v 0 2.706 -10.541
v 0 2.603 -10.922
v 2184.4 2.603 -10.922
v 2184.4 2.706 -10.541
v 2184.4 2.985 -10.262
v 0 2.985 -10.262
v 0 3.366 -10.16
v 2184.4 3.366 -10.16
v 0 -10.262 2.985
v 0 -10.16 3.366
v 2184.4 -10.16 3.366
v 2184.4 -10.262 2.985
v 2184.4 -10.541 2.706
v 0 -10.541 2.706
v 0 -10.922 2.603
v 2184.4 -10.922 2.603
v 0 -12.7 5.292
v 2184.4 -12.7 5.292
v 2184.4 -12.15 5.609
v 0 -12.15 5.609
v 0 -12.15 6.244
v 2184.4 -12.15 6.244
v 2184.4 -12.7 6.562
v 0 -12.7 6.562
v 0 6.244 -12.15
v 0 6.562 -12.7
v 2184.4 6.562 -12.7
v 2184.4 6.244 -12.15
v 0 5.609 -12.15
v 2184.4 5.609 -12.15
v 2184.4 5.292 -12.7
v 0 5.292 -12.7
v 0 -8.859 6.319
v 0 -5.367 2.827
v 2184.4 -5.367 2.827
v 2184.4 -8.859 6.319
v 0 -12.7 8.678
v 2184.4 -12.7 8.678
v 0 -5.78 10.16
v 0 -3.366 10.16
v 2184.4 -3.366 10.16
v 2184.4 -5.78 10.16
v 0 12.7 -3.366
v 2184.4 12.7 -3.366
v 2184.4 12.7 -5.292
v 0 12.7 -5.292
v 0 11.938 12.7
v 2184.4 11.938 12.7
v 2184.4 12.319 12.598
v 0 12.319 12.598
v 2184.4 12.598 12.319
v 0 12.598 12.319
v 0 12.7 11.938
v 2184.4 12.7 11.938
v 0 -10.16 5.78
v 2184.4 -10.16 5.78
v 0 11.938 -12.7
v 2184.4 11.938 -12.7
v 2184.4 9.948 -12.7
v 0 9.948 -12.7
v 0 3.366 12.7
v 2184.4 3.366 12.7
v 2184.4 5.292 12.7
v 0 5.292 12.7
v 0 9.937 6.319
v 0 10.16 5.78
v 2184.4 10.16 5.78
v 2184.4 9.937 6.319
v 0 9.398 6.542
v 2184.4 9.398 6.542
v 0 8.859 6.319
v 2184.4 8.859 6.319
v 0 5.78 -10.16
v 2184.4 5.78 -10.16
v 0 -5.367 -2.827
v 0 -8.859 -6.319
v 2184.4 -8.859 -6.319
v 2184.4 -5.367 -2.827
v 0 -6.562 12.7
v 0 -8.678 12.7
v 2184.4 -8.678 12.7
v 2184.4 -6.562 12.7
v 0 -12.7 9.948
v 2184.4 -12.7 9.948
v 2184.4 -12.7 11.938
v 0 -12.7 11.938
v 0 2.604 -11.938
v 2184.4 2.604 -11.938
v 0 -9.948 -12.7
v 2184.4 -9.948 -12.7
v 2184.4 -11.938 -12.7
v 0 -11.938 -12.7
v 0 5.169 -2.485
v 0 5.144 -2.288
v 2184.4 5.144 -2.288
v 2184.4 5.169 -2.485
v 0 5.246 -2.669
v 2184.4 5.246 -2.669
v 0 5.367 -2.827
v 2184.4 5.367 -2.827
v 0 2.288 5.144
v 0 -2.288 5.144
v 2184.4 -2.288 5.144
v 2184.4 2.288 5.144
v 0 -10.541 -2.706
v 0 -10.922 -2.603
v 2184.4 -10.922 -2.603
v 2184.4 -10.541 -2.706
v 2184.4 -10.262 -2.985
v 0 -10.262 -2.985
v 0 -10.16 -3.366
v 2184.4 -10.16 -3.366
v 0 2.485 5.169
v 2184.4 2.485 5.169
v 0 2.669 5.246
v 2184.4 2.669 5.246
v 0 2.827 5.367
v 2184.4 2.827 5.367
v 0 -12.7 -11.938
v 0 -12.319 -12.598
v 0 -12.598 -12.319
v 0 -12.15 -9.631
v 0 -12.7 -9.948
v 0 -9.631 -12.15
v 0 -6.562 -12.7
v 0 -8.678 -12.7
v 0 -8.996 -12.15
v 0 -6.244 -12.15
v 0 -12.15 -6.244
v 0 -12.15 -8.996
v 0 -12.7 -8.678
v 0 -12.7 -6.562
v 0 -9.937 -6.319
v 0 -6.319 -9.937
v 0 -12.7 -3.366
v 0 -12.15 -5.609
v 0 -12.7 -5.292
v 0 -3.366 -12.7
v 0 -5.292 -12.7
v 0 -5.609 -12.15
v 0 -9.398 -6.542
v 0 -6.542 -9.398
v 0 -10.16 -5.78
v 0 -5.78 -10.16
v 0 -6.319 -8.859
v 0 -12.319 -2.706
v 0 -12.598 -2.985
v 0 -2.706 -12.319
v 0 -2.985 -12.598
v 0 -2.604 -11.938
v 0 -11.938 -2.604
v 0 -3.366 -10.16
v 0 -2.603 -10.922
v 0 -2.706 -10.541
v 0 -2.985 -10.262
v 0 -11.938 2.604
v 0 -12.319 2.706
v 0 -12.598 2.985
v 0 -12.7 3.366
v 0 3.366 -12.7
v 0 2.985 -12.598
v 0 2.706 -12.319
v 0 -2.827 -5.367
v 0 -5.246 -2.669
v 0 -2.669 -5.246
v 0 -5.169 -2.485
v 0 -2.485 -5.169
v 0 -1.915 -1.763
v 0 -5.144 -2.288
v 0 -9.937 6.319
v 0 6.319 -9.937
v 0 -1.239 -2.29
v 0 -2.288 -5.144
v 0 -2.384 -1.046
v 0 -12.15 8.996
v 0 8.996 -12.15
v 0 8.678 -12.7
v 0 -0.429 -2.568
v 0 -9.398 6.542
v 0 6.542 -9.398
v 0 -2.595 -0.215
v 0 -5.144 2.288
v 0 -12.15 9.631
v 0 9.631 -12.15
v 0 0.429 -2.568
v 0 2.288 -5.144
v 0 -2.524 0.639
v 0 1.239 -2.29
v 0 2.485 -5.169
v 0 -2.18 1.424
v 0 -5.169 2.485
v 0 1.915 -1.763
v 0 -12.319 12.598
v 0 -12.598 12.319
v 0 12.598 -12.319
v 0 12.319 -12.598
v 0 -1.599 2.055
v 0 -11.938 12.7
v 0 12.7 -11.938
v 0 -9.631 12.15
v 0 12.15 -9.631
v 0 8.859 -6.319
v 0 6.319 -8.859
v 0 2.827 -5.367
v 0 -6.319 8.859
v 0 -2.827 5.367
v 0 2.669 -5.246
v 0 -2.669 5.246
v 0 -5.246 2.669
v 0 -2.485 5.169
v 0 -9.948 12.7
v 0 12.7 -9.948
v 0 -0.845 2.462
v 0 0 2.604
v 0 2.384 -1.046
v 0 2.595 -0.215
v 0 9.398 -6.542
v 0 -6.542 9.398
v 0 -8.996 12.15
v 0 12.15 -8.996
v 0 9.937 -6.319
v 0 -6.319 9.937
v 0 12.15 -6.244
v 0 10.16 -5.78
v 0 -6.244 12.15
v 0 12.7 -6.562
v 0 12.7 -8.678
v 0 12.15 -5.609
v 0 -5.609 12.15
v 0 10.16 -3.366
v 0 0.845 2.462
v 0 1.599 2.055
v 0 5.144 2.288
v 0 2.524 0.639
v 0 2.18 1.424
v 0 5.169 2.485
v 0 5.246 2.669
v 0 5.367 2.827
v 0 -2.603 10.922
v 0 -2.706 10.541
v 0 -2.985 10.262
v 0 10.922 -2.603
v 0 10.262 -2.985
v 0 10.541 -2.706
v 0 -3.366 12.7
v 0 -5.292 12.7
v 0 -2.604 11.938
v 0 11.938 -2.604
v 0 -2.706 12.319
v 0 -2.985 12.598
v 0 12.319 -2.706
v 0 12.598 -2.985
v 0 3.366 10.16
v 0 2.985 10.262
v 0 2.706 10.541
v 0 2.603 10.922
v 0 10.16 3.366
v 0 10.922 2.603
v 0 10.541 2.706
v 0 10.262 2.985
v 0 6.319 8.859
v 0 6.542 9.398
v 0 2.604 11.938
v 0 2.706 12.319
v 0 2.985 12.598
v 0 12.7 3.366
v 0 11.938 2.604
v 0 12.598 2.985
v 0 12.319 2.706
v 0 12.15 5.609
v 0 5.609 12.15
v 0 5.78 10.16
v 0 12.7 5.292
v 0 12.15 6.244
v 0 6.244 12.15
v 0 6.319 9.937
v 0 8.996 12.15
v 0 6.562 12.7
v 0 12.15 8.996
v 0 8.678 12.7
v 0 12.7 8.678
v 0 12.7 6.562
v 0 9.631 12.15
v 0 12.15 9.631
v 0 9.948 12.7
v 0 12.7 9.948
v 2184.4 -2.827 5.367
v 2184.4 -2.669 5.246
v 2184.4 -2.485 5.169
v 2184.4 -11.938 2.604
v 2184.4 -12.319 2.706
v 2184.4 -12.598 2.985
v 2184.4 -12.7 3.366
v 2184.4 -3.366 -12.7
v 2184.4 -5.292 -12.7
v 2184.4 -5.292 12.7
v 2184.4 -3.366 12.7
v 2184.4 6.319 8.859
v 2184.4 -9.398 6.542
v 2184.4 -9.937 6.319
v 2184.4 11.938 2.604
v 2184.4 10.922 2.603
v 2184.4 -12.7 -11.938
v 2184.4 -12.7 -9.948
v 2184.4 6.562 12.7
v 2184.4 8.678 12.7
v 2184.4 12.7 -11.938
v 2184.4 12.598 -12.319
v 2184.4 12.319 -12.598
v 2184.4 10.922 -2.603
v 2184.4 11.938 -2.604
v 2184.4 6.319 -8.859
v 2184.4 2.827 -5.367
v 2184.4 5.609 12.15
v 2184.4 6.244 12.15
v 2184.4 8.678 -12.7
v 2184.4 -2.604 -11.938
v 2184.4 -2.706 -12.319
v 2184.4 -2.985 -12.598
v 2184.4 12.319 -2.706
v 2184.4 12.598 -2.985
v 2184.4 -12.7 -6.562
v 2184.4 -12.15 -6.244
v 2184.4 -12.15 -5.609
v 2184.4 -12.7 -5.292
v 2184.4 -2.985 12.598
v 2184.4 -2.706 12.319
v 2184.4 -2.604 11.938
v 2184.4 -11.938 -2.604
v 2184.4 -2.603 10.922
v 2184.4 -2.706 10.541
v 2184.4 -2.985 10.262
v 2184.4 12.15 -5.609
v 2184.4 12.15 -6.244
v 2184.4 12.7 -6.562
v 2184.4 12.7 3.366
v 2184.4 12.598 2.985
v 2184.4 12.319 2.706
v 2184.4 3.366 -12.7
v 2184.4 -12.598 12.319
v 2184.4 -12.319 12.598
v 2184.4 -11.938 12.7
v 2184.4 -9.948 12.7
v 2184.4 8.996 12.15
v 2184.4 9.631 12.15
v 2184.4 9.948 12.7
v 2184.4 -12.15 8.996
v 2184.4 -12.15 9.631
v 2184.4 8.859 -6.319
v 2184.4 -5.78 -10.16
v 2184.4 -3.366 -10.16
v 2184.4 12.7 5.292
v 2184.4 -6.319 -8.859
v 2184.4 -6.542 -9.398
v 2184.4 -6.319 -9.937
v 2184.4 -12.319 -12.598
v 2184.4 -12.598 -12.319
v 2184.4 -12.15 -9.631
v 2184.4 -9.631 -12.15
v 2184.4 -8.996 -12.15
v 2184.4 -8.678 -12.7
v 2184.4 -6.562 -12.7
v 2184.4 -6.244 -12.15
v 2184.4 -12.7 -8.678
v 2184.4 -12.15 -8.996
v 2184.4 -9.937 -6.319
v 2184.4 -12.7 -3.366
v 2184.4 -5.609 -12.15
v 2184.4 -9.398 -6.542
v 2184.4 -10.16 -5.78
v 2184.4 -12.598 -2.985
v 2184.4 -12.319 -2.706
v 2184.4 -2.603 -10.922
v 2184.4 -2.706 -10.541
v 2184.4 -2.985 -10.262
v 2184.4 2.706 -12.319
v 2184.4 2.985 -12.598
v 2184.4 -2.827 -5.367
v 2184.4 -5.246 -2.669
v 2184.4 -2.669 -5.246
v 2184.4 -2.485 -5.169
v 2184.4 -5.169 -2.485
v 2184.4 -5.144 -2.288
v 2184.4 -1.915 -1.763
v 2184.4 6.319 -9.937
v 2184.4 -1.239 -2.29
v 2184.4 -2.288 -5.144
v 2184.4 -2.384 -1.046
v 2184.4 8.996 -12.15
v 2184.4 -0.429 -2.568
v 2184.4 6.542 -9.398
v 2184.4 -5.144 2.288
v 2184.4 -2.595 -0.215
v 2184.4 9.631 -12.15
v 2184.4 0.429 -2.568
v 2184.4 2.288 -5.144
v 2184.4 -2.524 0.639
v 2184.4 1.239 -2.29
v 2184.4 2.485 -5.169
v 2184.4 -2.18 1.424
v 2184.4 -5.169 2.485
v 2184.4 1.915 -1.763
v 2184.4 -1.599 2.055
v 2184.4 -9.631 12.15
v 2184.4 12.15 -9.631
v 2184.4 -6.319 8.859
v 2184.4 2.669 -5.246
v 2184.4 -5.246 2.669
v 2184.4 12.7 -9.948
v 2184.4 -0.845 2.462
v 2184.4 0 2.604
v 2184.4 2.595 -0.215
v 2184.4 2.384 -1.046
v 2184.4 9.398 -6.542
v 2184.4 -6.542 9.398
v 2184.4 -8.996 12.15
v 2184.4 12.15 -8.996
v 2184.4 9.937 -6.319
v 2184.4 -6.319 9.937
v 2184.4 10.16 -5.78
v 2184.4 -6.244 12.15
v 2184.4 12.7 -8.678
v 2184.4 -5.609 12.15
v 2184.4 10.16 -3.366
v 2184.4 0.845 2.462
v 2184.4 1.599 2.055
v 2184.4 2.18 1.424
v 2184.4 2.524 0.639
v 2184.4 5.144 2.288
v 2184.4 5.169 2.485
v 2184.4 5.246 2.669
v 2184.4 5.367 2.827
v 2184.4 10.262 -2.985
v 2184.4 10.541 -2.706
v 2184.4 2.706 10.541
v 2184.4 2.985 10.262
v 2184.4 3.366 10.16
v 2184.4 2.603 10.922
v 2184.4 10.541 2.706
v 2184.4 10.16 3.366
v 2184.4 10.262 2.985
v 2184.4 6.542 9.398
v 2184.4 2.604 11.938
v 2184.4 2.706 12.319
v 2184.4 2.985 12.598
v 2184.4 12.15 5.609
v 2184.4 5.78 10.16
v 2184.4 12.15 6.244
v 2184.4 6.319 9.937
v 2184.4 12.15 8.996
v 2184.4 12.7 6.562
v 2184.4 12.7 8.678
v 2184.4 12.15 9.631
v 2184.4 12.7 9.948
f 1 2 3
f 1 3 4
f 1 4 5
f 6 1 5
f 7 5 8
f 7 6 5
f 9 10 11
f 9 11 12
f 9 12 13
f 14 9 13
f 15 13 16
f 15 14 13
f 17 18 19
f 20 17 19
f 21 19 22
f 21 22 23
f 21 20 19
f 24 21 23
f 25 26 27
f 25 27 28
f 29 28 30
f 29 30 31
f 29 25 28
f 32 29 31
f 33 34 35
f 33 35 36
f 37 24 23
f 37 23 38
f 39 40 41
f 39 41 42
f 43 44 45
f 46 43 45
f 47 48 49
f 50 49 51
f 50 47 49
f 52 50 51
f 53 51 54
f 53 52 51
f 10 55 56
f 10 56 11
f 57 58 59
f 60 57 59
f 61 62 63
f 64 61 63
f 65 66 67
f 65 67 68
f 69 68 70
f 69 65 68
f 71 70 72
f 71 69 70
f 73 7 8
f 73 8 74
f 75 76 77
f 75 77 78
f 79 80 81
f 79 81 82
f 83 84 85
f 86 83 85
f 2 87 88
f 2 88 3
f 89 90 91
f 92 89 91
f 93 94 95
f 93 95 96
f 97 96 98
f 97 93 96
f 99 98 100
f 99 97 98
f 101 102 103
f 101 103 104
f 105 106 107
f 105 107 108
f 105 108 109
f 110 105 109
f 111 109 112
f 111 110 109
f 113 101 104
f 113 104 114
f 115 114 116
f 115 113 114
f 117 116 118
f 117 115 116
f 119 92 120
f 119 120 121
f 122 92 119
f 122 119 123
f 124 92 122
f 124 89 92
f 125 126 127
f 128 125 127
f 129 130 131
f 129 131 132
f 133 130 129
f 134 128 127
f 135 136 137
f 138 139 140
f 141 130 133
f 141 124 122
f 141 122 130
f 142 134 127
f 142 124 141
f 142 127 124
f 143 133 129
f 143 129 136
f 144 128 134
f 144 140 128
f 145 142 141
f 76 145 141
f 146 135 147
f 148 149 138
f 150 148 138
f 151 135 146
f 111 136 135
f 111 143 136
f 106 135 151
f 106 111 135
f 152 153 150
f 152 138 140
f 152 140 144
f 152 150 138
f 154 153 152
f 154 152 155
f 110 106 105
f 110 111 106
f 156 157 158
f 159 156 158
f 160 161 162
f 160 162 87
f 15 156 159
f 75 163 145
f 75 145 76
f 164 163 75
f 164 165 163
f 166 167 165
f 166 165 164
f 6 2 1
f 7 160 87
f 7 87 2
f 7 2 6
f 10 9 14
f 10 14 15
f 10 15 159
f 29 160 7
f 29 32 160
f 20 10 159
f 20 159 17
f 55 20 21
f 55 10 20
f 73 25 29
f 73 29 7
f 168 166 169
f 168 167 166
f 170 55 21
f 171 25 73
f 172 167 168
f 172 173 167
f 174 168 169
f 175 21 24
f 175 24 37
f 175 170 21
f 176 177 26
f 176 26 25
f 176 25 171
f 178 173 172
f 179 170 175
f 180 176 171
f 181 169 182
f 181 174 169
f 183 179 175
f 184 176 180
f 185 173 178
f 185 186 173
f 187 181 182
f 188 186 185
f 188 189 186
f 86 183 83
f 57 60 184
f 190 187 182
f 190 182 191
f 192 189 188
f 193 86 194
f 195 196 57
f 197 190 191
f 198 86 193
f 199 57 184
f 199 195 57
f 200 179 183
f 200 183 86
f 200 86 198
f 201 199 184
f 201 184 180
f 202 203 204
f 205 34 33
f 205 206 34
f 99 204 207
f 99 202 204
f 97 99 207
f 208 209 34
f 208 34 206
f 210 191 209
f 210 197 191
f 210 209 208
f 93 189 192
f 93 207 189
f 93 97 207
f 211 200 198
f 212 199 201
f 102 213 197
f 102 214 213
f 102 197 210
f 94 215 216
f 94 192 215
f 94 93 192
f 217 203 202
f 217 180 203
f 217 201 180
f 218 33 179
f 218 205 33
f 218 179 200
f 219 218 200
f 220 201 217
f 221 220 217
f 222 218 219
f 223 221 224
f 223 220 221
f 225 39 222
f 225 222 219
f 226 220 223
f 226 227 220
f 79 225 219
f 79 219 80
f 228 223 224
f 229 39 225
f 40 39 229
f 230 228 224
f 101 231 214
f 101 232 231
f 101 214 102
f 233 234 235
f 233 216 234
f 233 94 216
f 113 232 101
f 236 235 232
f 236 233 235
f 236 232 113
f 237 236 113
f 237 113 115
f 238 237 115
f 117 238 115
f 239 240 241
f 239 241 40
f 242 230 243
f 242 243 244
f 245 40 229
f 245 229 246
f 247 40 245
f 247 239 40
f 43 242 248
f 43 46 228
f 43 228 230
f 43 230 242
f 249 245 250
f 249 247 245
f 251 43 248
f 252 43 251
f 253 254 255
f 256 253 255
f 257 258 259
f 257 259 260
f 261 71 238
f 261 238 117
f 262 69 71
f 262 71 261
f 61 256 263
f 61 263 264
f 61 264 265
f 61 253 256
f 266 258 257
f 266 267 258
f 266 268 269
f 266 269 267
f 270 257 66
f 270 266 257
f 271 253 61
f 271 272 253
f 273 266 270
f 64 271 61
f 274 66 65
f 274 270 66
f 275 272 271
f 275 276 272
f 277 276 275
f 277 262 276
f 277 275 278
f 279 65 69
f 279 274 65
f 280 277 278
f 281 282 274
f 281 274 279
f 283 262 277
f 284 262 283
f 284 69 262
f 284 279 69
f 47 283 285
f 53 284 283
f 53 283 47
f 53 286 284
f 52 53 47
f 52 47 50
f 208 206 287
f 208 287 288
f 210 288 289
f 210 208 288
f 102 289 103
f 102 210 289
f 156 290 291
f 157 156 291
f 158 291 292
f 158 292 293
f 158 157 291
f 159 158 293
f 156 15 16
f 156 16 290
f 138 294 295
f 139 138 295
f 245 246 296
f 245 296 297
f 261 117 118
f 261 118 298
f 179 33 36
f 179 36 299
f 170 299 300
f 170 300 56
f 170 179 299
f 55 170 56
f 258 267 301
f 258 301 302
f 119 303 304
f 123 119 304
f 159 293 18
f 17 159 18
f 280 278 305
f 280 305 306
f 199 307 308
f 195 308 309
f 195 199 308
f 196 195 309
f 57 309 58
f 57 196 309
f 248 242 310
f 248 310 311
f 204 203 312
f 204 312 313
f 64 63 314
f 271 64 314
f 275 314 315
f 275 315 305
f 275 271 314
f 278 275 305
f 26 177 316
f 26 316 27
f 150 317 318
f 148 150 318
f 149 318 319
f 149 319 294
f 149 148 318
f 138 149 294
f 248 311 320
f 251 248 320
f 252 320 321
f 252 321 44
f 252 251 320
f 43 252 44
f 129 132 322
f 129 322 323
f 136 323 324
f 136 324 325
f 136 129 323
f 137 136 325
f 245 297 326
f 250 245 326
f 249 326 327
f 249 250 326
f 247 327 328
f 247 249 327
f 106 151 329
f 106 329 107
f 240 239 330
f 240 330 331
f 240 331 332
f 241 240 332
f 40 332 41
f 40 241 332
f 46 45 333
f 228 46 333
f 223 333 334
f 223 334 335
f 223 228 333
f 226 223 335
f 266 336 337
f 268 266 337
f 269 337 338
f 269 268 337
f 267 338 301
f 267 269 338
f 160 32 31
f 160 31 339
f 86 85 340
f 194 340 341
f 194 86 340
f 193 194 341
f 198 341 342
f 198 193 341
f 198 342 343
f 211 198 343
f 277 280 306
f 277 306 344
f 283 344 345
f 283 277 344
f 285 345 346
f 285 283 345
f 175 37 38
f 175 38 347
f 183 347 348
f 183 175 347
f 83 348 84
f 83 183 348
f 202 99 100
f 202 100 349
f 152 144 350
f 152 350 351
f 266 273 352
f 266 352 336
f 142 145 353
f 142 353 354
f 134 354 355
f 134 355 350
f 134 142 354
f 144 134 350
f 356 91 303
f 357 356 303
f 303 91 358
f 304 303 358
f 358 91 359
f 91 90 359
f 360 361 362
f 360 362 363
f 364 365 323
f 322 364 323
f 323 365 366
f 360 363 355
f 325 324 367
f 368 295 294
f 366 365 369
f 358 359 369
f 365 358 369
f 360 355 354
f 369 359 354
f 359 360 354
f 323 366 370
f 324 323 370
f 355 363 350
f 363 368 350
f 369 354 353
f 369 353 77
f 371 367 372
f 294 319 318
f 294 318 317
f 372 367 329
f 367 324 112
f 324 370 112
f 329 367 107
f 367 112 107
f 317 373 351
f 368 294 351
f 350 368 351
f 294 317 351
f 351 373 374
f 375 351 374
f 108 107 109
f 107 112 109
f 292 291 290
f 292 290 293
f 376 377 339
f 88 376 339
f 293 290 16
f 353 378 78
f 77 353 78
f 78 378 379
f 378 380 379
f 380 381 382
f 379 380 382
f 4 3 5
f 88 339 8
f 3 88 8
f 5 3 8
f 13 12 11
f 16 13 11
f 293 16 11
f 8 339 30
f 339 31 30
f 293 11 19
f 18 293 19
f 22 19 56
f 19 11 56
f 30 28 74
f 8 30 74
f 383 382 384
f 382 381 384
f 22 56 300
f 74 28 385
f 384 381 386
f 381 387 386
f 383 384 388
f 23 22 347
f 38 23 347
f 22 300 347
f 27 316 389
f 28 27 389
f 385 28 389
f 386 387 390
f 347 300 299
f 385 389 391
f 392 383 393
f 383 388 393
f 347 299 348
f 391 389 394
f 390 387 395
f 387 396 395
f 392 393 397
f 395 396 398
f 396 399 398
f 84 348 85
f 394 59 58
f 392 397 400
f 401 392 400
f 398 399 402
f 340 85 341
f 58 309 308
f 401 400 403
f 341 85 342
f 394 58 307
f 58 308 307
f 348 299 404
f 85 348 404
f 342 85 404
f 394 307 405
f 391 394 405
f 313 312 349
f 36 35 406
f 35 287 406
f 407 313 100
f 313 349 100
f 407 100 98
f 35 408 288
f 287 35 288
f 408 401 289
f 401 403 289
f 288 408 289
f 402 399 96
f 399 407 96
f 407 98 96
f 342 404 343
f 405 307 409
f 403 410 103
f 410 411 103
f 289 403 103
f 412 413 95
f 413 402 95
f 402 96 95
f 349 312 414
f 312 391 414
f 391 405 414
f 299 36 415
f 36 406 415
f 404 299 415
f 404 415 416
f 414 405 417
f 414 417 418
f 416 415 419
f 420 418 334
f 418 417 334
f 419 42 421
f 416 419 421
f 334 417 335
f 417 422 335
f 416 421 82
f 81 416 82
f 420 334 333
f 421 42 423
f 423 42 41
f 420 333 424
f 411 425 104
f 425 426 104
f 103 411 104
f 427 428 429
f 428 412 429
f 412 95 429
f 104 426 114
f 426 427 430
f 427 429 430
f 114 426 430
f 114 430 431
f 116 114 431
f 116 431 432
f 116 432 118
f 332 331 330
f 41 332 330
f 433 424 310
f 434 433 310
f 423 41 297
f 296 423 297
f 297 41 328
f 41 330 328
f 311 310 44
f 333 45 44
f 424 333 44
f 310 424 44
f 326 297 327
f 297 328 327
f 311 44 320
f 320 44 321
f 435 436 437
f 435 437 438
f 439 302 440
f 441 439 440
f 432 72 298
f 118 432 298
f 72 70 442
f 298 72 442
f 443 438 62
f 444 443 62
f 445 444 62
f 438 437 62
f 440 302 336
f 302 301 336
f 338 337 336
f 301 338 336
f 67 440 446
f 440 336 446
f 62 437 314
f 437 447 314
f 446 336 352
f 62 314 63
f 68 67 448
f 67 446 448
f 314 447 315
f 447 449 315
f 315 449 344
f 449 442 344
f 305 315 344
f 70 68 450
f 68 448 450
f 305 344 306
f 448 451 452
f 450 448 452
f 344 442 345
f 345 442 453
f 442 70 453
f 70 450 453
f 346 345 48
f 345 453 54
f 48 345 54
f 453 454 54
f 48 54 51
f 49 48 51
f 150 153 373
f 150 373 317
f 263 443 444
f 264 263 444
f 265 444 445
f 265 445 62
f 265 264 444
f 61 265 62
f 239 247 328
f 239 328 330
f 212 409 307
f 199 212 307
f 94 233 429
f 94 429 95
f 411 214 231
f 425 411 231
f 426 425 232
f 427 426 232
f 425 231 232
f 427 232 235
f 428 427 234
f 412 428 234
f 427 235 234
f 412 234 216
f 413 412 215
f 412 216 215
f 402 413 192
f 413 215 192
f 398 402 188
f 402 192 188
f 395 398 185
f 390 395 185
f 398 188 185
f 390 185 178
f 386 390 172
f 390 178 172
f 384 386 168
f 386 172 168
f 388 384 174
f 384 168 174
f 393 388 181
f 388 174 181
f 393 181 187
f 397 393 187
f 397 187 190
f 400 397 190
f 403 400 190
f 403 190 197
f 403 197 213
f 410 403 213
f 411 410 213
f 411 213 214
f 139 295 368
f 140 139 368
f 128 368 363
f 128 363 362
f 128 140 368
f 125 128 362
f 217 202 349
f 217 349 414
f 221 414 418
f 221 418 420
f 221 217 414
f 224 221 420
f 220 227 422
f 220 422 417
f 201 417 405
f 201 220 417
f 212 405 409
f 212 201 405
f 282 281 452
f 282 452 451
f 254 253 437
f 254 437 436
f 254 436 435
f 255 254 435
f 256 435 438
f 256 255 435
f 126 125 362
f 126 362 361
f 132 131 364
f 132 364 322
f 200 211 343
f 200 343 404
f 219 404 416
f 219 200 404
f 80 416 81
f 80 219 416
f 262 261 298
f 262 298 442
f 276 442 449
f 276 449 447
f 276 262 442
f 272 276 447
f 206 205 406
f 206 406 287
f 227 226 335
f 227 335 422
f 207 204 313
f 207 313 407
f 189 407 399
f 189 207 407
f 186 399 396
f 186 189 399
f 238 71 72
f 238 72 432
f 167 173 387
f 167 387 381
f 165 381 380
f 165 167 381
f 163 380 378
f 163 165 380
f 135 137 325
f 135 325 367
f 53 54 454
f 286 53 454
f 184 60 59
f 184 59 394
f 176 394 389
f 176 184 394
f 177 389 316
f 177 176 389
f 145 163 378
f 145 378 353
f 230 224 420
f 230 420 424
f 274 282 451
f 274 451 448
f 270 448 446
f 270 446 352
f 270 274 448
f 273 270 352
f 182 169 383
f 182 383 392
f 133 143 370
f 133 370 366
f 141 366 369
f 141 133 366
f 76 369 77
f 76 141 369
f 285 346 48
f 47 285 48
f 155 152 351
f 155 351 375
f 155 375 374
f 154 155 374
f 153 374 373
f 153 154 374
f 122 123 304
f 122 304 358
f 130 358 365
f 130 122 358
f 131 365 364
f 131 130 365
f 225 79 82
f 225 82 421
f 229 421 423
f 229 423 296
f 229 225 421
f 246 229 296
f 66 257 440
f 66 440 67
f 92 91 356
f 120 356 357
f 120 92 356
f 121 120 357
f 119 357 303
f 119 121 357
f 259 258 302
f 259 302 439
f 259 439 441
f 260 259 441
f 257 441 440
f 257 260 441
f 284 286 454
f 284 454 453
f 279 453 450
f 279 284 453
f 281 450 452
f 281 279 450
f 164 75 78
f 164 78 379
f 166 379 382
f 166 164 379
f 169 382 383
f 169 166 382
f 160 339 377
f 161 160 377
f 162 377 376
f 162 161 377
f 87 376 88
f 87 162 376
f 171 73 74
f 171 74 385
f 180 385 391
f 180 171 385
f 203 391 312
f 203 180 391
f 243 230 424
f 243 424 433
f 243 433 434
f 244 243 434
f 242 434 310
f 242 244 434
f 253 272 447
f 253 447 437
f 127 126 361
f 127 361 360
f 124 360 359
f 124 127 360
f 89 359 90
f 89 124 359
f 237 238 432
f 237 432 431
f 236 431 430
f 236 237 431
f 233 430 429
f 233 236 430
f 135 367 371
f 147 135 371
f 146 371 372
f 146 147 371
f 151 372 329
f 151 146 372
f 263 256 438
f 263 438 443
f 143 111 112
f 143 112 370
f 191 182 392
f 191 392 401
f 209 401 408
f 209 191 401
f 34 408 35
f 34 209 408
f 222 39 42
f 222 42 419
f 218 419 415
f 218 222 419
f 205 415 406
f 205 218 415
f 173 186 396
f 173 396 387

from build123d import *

# Parameters (mm, degrees)
BOSS_EXTRUDE1_DEPTH = 2184.4
SKETCH2_R           = 2.6035
CUT_EXTRUDE1_DEPTH  = 2184.4


with BuildPart() as part:
    # Sketch1 → Boss-Extrude1 (new body)
    with BuildSketch(Plane(origin=(0, 0, 0), x_dir=(0, 0, -1), z_dir=(1, 0, 0))):
        with BuildLine():
            Line((-2.6035, 11.938), (-2.6035, 10.922))
            ThreePointArc((-2.6035, 10.922), (-2.826684633, 10.383184633), (-3.3655, 10.16))
            Line((-3.3655, 10.16), (-5.780369265, 10.16))
            ThreePointArc((-5.780369265, 10.16), (-6.484365469, 9.689604775), (-6.319184633, 8.859184633))
            Line((-6.319184633, 8.859184633), (-2.826684633, 5.366684633))
            ThreePointArc((-2.826684633, 5.366684633), (-2.579474041, 5.201503796), (-2.287869265, 5.1435))
            Line((-2.287869265, 5.1435), (2.287869265, 5.1435))
            ThreePointArc((2.287869265, 5.1435), (2.579474041, 5.201503796), (2.826684633, 5.366684633))
            Line((2.826684633, 5.366684633), (6.319184633, 8.859184633))
            ThreePointArc((6.319184633, 8.859184633), (6.484365469, 9.689604775), (5.780369265, 10.16))
            Line((5.780369265, 10.16), (3.3655, 10.16))
            ThreePointArc((3.3655, 10.16), (2.826684633, 10.383184633), (2.6035, 10.922))
            Line((2.6035, 10.922), (2.6035, 11.938))
            ThreePointArc((2.6035, 11.938), (2.826684633, 12.476815367), (3.3655, 12.7))
            Line((3.3655, 12.7), (5.2917598, 12.7))
            ThreePointArc((5.2917598, 12.7), (5.9267598, 12.065), (6.5617598, 12.7))
            Line((6.5617598, 12.7), (8.6783418, 12.7))
            ThreePointArc((8.6783418, 12.7), (9.3133418, 12.065), (9.9483418, 12.7))
            Line((9.9483418, 12.7), (11.938, 12.7))
            ThreePointArc((11.938, 12.7), (12.476815367, 12.476815367), (12.7, 11.938))
            Line((12.7, 11.938), (12.7, 9.9483418))
            ThreePointArc((12.7, 9.9483418), (12.065, 9.3133418), (12.7, 8.6783418))
            Line((12.7, 8.6783418), (12.7, 6.5616836))
            ThreePointArc((12.7, 6.5616836), (12.065, 5.9266836), (12.7, 5.2916836))
            Line((12.7, 5.2916836), (12.7, 3.3655))
            ThreePointArc((12.7, 3.3655), (12.476815367, 2.826684633), (11.938, 2.6035))
            Line((11.938, 2.6035), (10.922, 2.6035))
            ThreePointArc((10.922, 2.6035), (10.383184633, 2.826684633), (10.16, 3.3655))
            Line((10.16, 3.3655), (10.16, 5.780369265))
            ThreePointArc((10.16, 5.780369265), (9.689604775, 6.484365469), (8.859184633, 6.319184633))
            Line((8.859184633, 6.319184633), (5.366684633, 2.826684633))
            ThreePointArc((5.366684633, 2.826684633), (5.201503796, 2.579474041), (5.1435, 2.287869265))
            Line((5.1435, 2.287869265), (5.1435, -2.287869265))
            ThreePointArc((5.1435, -2.287869265), (5.201503796, -2.579474041), (5.366684633, -2.826684633))
            Line((5.366684633, -2.826684633), (8.859184633, -6.319184633))
            ThreePointArc((8.859184633, -6.319184633), (9.689604775, -6.484365469), (10.16, -5.780369265))
            Line((10.16, -5.780369265), (10.16, -3.3655))
            ThreePointArc((10.16, -3.3655), (10.383184633, -2.826684633), (10.922, -2.6035))
            Line((10.922, -2.6035), (11.938, -2.6035))
            ThreePointArc((11.938, -2.6035), (12.476815367, -2.826684633), (12.7, -3.3655))
            Line((12.7, -3.3655), (12.7, -5.2917598))
            ThreePointArc((12.7, -5.2917598), (12.065, -5.9267598), (12.7, -6.5617598))
            Line((12.7, -6.5617598), (12.7, -8.6783418))
            ThreePointArc((12.7, -8.6783418), (12.065, -9.3133418), (12.7, -9.9483418))
            Line((12.7, -9.9483418), (12.7, -11.938))
            ThreePointArc((12.7, -11.938), (12.476815367, -12.476815367), (11.938, -12.7))
            Line((11.938, -12.7), (9.9483418, -12.7))
            ThreePointArc((9.9483418, -12.7), (9.3133418, -12.065), (8.6783418, -12.7))
            Line((8.6783418, -12.7), (6.5616836, -12.7))
            ThreePointArc((6.5616836, -12.7), (5.9266836, -12.065), (5.2916836, -12.7))
            Line((5.2916836, -12.7), (3.3655, -12.7))
            ThreePointArc((3.3655, -12.7), (2.826684633, -12.476815367), (2.6035, -11.938))
            Line((2.6035, -11.938), (2.6035, -10.922))
            ThreePointArc((2.6035, -10.922), (2.826684633, -10.383184633), (3.3655, -10.16))
            Line((3.3655, -10.16), (5.780369265, -10.16))
            ThreePointArc((5.780369265, -10.16), (6.484365469, -9.689604775), (6.319184633, -8.859184633))
            Line((6.319184633, -8.859184633), (2.826684633, -5.366684633))
            ThreePointArc((2.826684633, -5.366684633), (2.579474041, -5.201503796), (2.287869265, -5.1435))
            Line((2.287869265, -5.1435), (-2.287869265, -5.1435))
            ThreePointArc((-2.287869265, -5.1435), (-2.579474041, -5.201503796), (-2.826684633, -5.366684633))
            Line((-2.826684633, -5.366684633), (-6.319184633, -8.859184633))
            ThreePointArc((-6.319184633, -8.859184633), (-6.484365469, -9.689604775), (-5.780369265, -10.16))
            Line((-5.780369265, -10.16), (-3.3655, -10.16))
            ThreePointArc((-3.3655, -10.16), (-2.826684633, -10.383184633), (-2.6035, -10.922))
            Line((-2.6035, -10.922), (-2.6035, -11.938))
            ThreePointArc((-2.6035, -11.938), (-2.826684633, -12.476815367), (-3.3655, -12.7))
            Line((-3.3655, -12.7), (-5.2917598, -12.7))
            ThreePointArc((-5.2917598, -12.7), (-5.9267598, -12.065), (-6.5617598, -12.7))
            Line((-6.5617598, -12.7), (-8.6783418, -12.7))
            ThreePointArc((-8.6783418, -12.7), (-9.3133418, -12.065), (-9.9483418, -12.7))
            Line((-9.9483418, -12.7), (-11.938, -12.7))
            ThreePointArc((-11.938, -12.7), (-12.476815367, -12.476815367), (-12.7, -11.938))
            Line((-12.7, -11.938), (-12.7, -9.9483418))
            ThreePointArc((-12.7, -9.9483418), (-12.065, -9.3133418), (-12.7, -8.6783418))
            Line((-12.7, -8.6783418), (-12.7, -6.5616836))
            ThreePointArc((-12.7, -6.5616836), (-12.065, -5.9266836), (-12.7, -5.2916836))
            Line((-12.7, -5.2916836), (-12.7, -3.3655))
            ThreePointArc((-12.7, -3.3655), (-12.476815367, -2.826684633), (-11.938, -2.6035))
            Line((-11.938, -2.6035), (-10.922, -2.6035))
            ThreePointArc((-10.922, -2.6035), (-10.383184633, -2.826684633), (-10.16, -3.3655))
            Line((-10.16, -3.3655), (-10.16, -5.780369265))
            ThreePointArc((-10.16, -5.780369265), (-9.689604775, -6.484365469), (-8.859184633, -6.319184633))
            Line((-8.859184633, -6.319184633), (-5.366684633, -2.826684633))
            ThreePointArc((-5.366684633, -2.826684633), (-5.201503796, -2.579474041), (-5.1435, -2.287869265))
            Line((-5.1435, -2.287869265), (-5.1435, 2.287869265))
            ThreePointArc((-5.1435, 2.287869265), (-5.201503796, 2.579474041), (-5.366684633, 2.826684633))
            Line((-5.366684633, 2.826684633), (-8.859184633, 6.319184633))
            ThreePointArc((-8.859184633, 6.319184633), (-9.689604775, 6.484365469), (-10.16, 5.780369265))
            Line((-10.16, 5.780369265), (-10.16, 3.3655))
            ThreePointArc((-10.16, 3.3655), (-10.383184633, 2.826684633), (-10.922, 2.6035))
            Line((-10.922, 2.6035), (-11.938, 2.6035))
            ThreePointArc((-11.938, 2.6035), (-12.476815367, 2.826684633), (-12.7, 3.3655))
            Line((-12.7, 3.3655), (-12.7, 5.2917598))
            ThreePointArc((-12.7, 5.2917598), (-12.065, 5.9267598), (-12.7, 6.5617598))
            Line((-12.7, 6.5617598), (-12.7, 8.6783418))
            ThreePointArc((-12.7, 8.6783418), (-12.065, 9.3133418), (-12.7, 9.9483418))
            Line((-12.7, 9.9483418), (-12.7, 11.938))
            ThreePointArc((-12.7, 11.938), (-12.476815367, 12.476815367), (-11.938, 12.7))
            Line((-11.938, 12.7), (-9.9483418, 12.7))
            ThreePointArc((-9.9483418, 12.7), (-9.3133418, 12.065), (-8.6783418, 12.7))
            Line((-8.6783418, 12.7), (-6.5616836, 12.7))
            ThreePointArc((-6.5616836, 12.7), (-5.9266836, 12.065), (-5.2916836, 12.7))
            Line((-5.2916836, 12.7), (-3.3655, 12.7))
            ThreePointArc((-3.3655, 12.7), (-2.826684633, 12.476815367), (-2.6035, 11.938))
        make_face()
    extrude(amount=BOSS_EXTRUDE1_DEPTH)

    # Sketch2 → Cut-Extrude1 (cut)
    with BuildSketch(Plane.ZY):
        Circle(SKETCH2_R)
    extrude(amount=-CUT_EXTRUDE1_DEPTH, mode=Mode.SUBTRACT)


solid = part.part
